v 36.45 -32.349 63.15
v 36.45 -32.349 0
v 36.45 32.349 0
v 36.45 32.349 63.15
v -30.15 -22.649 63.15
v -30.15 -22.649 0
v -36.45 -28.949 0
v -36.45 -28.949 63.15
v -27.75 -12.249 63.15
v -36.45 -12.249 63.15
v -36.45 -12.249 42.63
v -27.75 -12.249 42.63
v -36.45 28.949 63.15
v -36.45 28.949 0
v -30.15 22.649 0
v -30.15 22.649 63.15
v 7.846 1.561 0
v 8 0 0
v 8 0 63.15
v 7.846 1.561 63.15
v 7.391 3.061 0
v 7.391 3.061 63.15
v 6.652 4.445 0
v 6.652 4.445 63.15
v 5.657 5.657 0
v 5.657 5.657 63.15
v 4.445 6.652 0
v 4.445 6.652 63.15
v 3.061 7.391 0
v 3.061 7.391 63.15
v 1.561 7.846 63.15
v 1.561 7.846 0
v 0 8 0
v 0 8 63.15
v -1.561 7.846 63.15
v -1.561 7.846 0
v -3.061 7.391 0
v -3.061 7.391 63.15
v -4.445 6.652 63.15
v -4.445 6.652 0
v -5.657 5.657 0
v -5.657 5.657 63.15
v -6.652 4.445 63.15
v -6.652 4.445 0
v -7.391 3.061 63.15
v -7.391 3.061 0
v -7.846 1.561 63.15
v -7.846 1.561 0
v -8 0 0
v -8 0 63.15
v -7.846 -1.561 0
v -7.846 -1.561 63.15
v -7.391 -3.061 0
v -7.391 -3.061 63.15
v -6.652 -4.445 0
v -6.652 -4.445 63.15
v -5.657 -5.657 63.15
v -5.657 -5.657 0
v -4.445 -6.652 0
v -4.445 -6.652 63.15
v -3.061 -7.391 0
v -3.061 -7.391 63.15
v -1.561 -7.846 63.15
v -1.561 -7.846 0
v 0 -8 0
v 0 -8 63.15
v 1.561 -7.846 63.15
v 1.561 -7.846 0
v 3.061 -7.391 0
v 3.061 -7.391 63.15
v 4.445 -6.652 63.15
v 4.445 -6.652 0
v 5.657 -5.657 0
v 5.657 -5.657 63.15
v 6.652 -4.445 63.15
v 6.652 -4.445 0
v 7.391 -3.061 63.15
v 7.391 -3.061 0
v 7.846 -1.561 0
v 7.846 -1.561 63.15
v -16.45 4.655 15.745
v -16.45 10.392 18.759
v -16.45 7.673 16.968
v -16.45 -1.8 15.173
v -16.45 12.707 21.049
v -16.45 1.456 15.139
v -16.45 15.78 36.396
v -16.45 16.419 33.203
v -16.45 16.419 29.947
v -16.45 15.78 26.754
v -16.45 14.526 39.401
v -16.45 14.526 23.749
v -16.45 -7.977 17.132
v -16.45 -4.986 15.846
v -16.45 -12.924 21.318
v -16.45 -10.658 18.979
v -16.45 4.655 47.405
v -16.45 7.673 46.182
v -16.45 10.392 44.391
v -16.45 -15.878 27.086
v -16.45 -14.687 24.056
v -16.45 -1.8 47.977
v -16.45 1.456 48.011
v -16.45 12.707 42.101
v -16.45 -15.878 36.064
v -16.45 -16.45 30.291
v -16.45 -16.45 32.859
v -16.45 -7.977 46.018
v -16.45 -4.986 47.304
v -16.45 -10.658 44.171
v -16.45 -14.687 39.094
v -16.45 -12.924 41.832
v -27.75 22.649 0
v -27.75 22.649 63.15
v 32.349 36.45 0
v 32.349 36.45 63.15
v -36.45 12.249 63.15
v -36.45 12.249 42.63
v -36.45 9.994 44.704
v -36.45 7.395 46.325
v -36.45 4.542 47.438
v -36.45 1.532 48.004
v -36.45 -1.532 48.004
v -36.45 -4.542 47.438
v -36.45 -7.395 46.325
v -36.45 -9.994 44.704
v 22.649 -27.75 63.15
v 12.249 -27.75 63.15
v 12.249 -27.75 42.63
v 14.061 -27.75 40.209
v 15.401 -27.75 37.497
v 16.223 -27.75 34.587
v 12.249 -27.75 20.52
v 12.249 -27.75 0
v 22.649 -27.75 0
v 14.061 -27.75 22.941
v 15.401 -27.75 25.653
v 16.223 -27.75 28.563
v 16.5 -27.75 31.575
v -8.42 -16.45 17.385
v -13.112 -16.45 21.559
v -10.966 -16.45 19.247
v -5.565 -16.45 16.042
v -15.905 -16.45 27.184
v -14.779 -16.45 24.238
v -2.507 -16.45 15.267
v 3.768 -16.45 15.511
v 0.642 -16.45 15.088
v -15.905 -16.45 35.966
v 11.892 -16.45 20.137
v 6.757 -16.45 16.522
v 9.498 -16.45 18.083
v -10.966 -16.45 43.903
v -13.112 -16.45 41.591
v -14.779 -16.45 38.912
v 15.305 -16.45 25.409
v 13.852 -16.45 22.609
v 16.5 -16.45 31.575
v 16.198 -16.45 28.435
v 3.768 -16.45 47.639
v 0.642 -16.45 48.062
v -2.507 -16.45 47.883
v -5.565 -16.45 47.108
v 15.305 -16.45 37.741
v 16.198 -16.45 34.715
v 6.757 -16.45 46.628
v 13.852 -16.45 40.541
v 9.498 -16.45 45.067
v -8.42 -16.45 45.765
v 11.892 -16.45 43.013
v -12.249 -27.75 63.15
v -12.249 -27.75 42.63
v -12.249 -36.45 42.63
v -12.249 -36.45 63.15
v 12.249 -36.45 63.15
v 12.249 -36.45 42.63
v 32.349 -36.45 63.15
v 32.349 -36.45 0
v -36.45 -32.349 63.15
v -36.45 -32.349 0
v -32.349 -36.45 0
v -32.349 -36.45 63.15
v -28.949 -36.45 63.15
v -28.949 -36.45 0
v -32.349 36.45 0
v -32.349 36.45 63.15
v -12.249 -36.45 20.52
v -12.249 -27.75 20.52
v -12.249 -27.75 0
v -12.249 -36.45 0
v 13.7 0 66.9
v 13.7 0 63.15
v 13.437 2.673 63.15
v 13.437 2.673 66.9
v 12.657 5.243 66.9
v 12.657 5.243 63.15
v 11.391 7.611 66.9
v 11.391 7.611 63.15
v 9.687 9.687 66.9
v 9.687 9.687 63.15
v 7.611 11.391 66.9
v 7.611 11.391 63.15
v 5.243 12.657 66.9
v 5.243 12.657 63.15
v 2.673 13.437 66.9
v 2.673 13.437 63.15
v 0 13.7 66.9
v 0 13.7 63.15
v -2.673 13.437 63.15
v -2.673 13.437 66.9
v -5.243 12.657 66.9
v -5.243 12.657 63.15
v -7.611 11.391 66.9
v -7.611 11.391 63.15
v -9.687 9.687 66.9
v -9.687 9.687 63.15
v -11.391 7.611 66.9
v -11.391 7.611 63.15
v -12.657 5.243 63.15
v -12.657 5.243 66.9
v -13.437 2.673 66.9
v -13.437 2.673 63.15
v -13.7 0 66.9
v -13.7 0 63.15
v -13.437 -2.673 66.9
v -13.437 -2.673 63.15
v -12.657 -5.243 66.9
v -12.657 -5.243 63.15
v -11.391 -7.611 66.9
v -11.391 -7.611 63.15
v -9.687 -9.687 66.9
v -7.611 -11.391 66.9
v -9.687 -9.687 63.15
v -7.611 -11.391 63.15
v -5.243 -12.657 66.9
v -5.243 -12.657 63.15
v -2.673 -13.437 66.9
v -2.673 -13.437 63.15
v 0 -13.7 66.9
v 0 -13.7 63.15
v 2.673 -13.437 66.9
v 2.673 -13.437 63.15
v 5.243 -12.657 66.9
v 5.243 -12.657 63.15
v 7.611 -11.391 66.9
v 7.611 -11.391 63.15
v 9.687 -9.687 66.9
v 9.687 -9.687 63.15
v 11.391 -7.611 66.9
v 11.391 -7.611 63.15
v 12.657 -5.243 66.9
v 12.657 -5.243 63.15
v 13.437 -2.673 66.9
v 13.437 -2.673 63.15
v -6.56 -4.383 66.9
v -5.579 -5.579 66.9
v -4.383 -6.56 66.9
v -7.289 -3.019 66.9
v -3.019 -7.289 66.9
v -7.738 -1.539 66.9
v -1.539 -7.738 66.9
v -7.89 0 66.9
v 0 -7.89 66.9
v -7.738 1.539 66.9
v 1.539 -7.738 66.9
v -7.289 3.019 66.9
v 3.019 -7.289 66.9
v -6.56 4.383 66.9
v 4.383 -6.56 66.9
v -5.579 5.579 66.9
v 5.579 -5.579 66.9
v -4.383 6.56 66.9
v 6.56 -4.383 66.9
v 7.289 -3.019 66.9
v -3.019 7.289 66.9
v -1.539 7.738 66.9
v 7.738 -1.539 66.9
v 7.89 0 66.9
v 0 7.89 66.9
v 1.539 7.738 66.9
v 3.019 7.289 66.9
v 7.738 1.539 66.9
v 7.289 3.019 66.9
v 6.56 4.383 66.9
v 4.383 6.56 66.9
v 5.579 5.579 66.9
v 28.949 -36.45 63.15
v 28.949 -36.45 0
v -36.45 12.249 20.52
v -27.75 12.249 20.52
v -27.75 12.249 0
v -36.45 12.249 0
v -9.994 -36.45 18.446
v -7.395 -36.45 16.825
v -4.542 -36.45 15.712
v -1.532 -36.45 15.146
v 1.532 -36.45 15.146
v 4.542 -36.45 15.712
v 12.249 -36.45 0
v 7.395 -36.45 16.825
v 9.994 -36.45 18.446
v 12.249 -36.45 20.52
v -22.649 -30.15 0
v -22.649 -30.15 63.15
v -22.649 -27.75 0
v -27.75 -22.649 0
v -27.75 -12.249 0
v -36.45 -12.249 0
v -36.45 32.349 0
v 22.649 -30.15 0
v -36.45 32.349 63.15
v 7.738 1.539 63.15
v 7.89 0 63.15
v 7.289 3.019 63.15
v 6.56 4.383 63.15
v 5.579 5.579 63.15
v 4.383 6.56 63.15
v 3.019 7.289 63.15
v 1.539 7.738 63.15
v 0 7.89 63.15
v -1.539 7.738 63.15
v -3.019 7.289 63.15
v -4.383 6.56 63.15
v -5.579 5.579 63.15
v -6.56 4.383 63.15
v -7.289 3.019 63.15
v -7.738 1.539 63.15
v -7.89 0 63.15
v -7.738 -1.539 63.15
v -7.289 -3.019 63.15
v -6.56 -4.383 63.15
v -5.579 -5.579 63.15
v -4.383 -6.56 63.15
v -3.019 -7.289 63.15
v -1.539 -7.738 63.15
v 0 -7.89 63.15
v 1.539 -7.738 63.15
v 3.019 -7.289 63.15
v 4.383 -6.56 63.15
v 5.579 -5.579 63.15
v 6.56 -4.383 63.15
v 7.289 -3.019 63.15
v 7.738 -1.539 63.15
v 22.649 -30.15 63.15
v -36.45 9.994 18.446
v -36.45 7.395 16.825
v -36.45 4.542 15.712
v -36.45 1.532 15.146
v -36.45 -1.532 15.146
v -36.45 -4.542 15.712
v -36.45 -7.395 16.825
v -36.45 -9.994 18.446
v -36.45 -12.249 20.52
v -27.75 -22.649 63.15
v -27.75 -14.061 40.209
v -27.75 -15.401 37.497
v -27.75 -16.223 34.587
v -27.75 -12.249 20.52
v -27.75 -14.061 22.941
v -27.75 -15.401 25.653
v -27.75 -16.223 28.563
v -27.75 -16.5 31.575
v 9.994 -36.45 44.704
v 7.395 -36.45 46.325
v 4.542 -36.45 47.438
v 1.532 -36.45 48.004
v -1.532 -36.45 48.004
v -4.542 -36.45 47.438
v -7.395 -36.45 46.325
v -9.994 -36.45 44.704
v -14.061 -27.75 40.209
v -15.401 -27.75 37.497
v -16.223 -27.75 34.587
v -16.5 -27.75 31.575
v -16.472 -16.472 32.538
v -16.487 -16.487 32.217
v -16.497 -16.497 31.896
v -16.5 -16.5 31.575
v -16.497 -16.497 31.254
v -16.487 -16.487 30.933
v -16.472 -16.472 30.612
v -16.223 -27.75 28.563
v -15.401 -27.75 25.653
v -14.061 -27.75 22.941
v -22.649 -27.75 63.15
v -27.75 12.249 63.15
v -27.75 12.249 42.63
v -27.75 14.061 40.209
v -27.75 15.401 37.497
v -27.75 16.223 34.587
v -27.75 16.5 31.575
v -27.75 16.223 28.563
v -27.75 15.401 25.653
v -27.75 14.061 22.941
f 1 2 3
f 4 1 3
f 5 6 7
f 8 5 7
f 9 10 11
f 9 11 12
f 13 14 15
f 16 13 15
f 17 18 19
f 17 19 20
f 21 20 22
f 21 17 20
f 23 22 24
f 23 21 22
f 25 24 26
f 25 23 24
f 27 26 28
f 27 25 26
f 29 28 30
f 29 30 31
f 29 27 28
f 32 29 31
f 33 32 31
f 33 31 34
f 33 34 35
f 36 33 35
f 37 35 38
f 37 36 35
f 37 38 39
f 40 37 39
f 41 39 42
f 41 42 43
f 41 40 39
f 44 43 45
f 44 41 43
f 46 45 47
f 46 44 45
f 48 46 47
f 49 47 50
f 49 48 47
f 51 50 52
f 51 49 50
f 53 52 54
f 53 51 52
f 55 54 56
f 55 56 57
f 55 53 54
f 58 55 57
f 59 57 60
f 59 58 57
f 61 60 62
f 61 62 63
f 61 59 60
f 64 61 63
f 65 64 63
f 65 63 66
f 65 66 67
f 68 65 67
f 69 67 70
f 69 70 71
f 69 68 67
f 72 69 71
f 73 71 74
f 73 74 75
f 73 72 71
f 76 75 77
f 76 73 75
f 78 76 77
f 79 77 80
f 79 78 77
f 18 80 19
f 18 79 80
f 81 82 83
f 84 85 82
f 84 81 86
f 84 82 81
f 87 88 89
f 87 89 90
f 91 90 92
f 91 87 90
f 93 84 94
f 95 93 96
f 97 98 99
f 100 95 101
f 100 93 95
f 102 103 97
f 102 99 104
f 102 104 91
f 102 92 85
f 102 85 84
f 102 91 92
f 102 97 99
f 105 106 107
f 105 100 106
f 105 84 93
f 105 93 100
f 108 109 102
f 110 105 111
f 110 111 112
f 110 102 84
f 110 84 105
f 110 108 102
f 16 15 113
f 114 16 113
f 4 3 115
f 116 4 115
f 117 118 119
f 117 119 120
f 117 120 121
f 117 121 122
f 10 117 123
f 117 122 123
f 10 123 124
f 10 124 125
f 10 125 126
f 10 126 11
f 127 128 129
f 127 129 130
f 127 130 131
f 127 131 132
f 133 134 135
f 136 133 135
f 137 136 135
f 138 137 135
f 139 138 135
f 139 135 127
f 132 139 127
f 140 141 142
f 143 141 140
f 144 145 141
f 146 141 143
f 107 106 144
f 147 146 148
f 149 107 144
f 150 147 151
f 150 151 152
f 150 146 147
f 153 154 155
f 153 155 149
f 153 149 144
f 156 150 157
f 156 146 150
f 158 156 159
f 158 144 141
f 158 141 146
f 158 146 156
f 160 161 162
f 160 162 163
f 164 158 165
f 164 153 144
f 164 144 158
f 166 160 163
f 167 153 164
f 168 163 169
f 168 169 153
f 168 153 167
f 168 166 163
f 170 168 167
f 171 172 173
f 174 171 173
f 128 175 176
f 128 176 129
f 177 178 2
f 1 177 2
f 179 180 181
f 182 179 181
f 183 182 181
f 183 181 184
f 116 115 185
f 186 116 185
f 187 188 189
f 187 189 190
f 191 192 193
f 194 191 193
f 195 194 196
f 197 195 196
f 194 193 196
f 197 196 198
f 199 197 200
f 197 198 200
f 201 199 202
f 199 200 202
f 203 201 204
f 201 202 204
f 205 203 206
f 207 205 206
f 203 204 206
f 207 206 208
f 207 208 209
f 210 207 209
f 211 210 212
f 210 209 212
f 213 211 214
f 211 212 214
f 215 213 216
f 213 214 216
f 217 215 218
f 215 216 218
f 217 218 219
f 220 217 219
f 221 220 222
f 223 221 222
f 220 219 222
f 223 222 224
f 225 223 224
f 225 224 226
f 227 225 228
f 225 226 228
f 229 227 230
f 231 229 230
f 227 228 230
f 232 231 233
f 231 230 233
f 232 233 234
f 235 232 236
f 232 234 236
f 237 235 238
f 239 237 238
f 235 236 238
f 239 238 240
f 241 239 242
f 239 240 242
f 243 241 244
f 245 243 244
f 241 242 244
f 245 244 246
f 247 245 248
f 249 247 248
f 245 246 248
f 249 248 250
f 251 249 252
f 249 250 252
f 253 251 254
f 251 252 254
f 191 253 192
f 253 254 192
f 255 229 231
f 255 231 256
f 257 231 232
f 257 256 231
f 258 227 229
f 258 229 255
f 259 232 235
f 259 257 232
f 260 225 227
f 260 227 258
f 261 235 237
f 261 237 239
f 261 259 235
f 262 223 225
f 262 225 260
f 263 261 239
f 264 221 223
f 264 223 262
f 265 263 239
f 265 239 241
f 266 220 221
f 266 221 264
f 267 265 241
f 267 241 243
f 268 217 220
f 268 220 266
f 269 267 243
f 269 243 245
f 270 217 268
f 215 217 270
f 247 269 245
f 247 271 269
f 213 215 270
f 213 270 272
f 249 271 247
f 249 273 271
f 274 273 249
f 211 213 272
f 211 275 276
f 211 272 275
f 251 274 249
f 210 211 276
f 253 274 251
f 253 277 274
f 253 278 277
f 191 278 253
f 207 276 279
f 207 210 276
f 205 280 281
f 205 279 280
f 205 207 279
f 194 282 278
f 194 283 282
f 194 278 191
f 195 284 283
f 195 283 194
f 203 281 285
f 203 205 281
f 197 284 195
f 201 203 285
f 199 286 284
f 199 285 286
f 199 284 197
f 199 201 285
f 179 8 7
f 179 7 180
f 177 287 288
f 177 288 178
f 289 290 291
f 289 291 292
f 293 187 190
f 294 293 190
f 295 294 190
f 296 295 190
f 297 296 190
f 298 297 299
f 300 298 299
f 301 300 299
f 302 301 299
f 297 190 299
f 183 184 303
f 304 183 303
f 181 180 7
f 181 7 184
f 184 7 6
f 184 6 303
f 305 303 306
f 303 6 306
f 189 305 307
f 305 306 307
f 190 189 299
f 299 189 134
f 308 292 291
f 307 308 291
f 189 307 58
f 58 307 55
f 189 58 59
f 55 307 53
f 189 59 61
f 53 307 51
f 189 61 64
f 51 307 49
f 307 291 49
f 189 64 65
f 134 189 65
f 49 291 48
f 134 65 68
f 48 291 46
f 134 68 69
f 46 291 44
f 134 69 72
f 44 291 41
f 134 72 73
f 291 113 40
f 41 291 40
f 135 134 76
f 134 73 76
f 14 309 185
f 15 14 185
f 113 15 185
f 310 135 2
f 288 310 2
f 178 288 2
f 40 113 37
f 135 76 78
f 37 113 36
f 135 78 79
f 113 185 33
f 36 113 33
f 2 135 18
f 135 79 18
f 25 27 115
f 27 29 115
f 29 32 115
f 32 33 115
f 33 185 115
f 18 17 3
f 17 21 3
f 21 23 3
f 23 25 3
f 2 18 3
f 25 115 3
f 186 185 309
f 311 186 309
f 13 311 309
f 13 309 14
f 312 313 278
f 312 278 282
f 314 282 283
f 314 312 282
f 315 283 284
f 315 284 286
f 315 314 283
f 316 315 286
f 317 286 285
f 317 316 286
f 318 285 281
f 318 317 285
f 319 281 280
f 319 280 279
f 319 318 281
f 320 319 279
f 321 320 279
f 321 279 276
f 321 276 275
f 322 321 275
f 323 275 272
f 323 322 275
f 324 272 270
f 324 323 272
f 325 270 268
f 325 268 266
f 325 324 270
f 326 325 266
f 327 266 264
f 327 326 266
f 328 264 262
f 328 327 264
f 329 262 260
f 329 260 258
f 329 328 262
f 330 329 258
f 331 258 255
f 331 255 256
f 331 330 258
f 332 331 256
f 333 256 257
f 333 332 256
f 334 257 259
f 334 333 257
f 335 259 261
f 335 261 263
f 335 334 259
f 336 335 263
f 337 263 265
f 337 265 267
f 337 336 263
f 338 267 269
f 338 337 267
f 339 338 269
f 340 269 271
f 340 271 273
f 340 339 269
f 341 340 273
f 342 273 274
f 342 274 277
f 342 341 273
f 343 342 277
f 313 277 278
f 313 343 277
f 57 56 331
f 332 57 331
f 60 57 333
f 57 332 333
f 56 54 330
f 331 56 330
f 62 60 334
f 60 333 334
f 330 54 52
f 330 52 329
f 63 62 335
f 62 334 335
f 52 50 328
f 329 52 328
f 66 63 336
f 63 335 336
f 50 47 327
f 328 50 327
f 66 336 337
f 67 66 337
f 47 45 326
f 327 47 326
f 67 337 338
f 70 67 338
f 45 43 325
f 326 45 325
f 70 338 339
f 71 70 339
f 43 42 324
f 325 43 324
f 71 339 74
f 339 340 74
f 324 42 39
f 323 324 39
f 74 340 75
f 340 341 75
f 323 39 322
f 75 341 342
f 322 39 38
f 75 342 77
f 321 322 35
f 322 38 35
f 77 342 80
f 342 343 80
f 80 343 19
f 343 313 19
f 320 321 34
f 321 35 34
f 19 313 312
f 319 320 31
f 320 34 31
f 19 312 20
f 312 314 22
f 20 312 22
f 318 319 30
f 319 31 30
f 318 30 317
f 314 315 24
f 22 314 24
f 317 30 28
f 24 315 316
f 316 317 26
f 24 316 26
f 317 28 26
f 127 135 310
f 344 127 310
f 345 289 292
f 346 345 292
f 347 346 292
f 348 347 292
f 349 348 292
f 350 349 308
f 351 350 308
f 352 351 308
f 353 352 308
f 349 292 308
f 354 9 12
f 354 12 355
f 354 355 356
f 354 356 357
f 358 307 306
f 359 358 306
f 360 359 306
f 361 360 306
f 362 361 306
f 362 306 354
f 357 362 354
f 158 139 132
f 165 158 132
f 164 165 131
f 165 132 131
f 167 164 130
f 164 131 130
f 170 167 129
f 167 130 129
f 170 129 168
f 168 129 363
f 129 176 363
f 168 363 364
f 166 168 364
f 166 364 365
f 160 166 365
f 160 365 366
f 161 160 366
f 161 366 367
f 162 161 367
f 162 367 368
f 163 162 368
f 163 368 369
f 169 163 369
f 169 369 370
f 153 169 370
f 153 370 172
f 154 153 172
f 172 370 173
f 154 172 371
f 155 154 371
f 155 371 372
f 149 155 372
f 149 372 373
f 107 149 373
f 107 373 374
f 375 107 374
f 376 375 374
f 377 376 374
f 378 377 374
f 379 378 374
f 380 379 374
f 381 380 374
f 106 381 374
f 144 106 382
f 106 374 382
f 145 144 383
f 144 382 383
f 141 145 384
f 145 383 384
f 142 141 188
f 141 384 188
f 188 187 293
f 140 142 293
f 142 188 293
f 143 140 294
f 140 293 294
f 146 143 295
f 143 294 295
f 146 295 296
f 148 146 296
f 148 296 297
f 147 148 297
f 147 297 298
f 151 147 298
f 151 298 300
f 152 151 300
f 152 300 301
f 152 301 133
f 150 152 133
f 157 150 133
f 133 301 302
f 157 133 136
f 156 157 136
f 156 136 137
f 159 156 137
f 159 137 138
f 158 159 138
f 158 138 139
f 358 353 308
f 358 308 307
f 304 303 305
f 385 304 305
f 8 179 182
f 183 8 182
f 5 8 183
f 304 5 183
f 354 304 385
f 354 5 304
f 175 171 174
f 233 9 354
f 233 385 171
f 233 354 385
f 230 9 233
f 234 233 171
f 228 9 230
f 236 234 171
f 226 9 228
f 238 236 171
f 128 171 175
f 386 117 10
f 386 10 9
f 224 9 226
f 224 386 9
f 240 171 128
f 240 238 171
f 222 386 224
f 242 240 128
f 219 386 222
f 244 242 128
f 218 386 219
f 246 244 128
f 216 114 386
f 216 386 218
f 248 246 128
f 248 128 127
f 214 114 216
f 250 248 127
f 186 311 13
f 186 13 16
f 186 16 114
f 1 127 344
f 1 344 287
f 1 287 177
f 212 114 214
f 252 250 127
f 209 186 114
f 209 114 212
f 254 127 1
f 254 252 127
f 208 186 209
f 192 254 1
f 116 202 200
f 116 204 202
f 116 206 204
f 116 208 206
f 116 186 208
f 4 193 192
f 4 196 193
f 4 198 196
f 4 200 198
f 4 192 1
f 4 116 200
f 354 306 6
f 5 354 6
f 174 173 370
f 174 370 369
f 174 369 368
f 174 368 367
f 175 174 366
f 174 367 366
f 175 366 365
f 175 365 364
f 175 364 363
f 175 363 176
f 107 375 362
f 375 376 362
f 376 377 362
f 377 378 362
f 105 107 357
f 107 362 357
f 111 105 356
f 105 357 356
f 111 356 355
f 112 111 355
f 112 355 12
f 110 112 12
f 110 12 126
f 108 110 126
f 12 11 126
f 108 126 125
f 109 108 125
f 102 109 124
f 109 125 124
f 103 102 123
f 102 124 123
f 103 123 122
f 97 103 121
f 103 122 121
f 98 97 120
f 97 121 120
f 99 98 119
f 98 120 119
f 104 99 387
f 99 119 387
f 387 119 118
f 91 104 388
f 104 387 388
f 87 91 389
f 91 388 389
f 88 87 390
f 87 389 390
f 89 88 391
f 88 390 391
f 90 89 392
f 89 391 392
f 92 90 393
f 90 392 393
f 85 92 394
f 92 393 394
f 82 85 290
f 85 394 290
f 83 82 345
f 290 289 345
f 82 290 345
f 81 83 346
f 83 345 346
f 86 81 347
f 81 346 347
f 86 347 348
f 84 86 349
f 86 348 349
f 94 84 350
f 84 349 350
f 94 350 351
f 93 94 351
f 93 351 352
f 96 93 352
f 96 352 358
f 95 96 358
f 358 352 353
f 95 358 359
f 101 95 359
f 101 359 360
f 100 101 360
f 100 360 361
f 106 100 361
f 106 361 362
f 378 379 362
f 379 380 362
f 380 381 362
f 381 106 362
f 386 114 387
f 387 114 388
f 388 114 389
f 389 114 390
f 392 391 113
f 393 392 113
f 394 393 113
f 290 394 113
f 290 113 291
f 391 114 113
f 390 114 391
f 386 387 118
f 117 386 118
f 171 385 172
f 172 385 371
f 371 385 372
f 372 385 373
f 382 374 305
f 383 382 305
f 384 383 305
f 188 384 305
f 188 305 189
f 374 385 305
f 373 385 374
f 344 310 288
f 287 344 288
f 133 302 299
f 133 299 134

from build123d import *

# Parameters (mm, degrees)
F0_R     = 8
F1_DEPTH = 63.15
F2_R     = 16.5
F3_DEPTH = 20
F4_R     = 16.5
F5_DEPTH = 20
F6_R     = 13.7
F6_R_2   = 7.89
F7_DEPTH = 3.75


with BuildPart() as f1:
    # F0 (on Top) → F1 (new body)
    with BuildSketch(Plane.XY):
        Polygon((32.348781, 36.45), (-32.348781, 36.45), (-36.45, 32.348781), (-36.45, 28.948781), (-30.15, 22.648781), (-27.75, 22.648781), (-27.75, 12.248781), (-36.45, 12.248781), (-36.45, -12.248781), (-27.75, -12.248781), (-27.75, -22.648781), (-30.15, -22.648781), (-36.45, -28.948781), (-36.45, -32.348781), (-32.348781, -36.45), (-28.948781, -36.45), (-22.648781, -30.15), (-22.648781, -27.75), (-12.248781, -27.75), (-12.248781, -36.45), (12.248781, -36.45), (12.248781, -27.75), (22.648781, -27.75), (22.648781, -30.15), (28.948781, -36.45), (32.348781, -36.45), (36.45, -32.348781), (36.45, 32.348781), align=None)
        Circle(F0_R, mode=Mode.SUBTRACT)
    extrude(amount=F1_DEPTH)

    # F2 (on face) → F3 (cut)
    with BuildSketch(Plane.XZ.offset(36.45)):
        with Locations((0, 31.575)):
            Circle(F2_R)
    extrude(amount=-F3_DEPTH, mode=Mode.SUBTRACT)

    # F4 (on face) → F5 (cut)
    with BuildSketch(Plane(origin=(-36.45, 0, 0), x_dir=(0, -1, 0), z_dir=(-1, 0, 0))):
        with Locations((0, 31.575)):
            Circle(F4_R)
    extrude(amount=-F5_DEPTH, mode=Mode.SUBTRACT)

    # F6 (on face) → F7 (join)
    with BuildSketch(Plane.XY.offset(63.15)):
        Circle(F6_R)
        Circle(F6_R_2, mode=Mode.SUBTRACT)
    extrude(amount=F7_DEPTH)


solid = f1.part
